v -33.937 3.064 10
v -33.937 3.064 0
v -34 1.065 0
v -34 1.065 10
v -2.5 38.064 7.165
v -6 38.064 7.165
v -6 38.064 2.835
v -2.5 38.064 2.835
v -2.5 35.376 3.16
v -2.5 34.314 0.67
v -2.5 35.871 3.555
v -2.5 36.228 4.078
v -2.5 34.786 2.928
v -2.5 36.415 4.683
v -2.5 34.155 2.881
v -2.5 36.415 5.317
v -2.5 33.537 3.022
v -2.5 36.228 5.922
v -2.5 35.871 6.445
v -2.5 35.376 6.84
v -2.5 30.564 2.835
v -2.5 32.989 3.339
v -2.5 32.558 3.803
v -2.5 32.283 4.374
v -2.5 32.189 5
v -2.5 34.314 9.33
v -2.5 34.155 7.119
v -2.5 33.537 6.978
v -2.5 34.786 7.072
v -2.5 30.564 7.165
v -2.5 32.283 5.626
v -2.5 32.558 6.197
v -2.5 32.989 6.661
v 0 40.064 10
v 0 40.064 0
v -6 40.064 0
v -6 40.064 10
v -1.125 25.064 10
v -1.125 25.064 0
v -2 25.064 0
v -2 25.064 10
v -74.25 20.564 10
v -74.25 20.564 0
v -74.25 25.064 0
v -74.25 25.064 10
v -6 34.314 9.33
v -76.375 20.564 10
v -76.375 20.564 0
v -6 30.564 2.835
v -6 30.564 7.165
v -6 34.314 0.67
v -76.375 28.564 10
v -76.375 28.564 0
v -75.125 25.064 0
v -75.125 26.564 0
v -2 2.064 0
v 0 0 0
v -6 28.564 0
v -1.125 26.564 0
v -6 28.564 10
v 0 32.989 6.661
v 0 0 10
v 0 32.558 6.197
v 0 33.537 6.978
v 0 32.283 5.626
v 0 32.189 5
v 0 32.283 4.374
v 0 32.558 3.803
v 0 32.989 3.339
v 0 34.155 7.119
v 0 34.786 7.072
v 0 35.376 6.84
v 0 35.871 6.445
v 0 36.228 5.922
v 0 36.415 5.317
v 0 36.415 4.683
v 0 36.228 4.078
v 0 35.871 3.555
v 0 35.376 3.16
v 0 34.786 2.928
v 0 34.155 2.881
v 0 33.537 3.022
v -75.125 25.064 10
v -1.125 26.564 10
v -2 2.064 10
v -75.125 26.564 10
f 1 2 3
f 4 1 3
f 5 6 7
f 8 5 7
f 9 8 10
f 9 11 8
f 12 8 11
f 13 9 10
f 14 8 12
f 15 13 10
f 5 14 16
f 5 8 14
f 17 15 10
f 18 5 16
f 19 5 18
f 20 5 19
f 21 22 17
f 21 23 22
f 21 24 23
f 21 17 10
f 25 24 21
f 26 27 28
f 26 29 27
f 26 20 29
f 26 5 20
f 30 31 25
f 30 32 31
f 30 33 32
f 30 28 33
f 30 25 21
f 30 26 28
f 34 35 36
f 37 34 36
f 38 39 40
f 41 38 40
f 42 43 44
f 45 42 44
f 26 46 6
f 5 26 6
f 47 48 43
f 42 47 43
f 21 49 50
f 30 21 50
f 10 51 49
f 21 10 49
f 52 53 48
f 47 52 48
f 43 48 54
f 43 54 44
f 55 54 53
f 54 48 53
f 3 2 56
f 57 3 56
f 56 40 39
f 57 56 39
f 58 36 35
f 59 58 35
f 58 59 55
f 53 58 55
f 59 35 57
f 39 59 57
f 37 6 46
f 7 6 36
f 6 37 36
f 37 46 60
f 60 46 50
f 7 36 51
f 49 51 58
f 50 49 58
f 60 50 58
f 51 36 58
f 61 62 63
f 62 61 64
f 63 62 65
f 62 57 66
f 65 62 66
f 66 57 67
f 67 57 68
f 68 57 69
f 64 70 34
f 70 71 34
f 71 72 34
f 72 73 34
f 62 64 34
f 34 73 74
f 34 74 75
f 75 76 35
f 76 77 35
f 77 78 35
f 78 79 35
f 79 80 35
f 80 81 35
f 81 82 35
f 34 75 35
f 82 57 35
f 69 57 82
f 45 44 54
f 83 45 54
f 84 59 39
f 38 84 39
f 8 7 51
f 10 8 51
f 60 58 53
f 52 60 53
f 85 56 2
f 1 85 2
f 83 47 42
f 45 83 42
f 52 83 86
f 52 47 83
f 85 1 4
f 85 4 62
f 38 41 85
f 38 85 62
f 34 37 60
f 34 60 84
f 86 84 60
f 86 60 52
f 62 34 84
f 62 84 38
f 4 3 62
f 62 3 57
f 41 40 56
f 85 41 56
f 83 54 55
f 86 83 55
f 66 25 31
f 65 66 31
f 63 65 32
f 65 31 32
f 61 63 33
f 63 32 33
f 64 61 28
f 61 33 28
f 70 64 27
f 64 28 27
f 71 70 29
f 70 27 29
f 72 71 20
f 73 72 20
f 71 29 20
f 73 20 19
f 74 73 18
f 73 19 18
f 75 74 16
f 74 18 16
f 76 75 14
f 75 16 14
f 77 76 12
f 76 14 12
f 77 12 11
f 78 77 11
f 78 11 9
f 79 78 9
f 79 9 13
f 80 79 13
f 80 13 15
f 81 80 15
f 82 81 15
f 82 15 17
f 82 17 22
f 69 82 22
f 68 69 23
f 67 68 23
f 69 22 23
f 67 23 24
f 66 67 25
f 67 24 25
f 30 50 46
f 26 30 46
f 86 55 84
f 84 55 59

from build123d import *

# Parameters (mm, degrees)
F1_DEPTH = 10
F3_DEPTH = 3.5
F4_R     = 2.125
F5_DEPTH = 2.5


with BuildPart() as f1:
    # F0 (on Top) → F1 (new body)
    with BuildSketch(Plane.XY):
        Polygon((-75.125, 26.563603), (-1.125, 26.563603), (-1.125, 25.063603), (-2, 25.063603), (-2, 2.063603), (-33.937408, 3.063603), (-34, 1.064582), (0, 0), (0, 40.063603), (-6, 40.063603), (-6, 28.563603), (-76.375, 28.563603), (-76.375, 20.563603), (-74.25, 20.563603), (-74.25, 25.063603), (-75.125, 25.063603), align=None)
    extrude(amount=F1_DEPTH)

    # F2 (on face) → F3 (cut)
    with BuildSketch(Plane(origin=(-6, 0, 0), x_dir=(0, -1, 0), z_dir=(-1, 0, 0))):
        Polygon((-30.563603, 2.834936), (-30.563603, 7.165064), (-34.313603, 9.330127), (-38.063603, 7.165064), (-38.063603, 2.834936), (-34.313603, 0.669873), align=None)
    extrude(amount=-F3_DEPTH, mode=Mode.SUBTRACT)

    # F4 (on face) → F5 (cut, through all)
    with BuildSketch(Plane(origin=(-2.5, 0, 0), x_dir=(0, -1, 0), z_dir=(-1, 0, 0))):
        with Locations((-34.313603, 5)):
            Circle(F4_R)
    extrude(amount=-F5_DEPTH, mode=Mode.SUBTRACT)


solid = f1.part
